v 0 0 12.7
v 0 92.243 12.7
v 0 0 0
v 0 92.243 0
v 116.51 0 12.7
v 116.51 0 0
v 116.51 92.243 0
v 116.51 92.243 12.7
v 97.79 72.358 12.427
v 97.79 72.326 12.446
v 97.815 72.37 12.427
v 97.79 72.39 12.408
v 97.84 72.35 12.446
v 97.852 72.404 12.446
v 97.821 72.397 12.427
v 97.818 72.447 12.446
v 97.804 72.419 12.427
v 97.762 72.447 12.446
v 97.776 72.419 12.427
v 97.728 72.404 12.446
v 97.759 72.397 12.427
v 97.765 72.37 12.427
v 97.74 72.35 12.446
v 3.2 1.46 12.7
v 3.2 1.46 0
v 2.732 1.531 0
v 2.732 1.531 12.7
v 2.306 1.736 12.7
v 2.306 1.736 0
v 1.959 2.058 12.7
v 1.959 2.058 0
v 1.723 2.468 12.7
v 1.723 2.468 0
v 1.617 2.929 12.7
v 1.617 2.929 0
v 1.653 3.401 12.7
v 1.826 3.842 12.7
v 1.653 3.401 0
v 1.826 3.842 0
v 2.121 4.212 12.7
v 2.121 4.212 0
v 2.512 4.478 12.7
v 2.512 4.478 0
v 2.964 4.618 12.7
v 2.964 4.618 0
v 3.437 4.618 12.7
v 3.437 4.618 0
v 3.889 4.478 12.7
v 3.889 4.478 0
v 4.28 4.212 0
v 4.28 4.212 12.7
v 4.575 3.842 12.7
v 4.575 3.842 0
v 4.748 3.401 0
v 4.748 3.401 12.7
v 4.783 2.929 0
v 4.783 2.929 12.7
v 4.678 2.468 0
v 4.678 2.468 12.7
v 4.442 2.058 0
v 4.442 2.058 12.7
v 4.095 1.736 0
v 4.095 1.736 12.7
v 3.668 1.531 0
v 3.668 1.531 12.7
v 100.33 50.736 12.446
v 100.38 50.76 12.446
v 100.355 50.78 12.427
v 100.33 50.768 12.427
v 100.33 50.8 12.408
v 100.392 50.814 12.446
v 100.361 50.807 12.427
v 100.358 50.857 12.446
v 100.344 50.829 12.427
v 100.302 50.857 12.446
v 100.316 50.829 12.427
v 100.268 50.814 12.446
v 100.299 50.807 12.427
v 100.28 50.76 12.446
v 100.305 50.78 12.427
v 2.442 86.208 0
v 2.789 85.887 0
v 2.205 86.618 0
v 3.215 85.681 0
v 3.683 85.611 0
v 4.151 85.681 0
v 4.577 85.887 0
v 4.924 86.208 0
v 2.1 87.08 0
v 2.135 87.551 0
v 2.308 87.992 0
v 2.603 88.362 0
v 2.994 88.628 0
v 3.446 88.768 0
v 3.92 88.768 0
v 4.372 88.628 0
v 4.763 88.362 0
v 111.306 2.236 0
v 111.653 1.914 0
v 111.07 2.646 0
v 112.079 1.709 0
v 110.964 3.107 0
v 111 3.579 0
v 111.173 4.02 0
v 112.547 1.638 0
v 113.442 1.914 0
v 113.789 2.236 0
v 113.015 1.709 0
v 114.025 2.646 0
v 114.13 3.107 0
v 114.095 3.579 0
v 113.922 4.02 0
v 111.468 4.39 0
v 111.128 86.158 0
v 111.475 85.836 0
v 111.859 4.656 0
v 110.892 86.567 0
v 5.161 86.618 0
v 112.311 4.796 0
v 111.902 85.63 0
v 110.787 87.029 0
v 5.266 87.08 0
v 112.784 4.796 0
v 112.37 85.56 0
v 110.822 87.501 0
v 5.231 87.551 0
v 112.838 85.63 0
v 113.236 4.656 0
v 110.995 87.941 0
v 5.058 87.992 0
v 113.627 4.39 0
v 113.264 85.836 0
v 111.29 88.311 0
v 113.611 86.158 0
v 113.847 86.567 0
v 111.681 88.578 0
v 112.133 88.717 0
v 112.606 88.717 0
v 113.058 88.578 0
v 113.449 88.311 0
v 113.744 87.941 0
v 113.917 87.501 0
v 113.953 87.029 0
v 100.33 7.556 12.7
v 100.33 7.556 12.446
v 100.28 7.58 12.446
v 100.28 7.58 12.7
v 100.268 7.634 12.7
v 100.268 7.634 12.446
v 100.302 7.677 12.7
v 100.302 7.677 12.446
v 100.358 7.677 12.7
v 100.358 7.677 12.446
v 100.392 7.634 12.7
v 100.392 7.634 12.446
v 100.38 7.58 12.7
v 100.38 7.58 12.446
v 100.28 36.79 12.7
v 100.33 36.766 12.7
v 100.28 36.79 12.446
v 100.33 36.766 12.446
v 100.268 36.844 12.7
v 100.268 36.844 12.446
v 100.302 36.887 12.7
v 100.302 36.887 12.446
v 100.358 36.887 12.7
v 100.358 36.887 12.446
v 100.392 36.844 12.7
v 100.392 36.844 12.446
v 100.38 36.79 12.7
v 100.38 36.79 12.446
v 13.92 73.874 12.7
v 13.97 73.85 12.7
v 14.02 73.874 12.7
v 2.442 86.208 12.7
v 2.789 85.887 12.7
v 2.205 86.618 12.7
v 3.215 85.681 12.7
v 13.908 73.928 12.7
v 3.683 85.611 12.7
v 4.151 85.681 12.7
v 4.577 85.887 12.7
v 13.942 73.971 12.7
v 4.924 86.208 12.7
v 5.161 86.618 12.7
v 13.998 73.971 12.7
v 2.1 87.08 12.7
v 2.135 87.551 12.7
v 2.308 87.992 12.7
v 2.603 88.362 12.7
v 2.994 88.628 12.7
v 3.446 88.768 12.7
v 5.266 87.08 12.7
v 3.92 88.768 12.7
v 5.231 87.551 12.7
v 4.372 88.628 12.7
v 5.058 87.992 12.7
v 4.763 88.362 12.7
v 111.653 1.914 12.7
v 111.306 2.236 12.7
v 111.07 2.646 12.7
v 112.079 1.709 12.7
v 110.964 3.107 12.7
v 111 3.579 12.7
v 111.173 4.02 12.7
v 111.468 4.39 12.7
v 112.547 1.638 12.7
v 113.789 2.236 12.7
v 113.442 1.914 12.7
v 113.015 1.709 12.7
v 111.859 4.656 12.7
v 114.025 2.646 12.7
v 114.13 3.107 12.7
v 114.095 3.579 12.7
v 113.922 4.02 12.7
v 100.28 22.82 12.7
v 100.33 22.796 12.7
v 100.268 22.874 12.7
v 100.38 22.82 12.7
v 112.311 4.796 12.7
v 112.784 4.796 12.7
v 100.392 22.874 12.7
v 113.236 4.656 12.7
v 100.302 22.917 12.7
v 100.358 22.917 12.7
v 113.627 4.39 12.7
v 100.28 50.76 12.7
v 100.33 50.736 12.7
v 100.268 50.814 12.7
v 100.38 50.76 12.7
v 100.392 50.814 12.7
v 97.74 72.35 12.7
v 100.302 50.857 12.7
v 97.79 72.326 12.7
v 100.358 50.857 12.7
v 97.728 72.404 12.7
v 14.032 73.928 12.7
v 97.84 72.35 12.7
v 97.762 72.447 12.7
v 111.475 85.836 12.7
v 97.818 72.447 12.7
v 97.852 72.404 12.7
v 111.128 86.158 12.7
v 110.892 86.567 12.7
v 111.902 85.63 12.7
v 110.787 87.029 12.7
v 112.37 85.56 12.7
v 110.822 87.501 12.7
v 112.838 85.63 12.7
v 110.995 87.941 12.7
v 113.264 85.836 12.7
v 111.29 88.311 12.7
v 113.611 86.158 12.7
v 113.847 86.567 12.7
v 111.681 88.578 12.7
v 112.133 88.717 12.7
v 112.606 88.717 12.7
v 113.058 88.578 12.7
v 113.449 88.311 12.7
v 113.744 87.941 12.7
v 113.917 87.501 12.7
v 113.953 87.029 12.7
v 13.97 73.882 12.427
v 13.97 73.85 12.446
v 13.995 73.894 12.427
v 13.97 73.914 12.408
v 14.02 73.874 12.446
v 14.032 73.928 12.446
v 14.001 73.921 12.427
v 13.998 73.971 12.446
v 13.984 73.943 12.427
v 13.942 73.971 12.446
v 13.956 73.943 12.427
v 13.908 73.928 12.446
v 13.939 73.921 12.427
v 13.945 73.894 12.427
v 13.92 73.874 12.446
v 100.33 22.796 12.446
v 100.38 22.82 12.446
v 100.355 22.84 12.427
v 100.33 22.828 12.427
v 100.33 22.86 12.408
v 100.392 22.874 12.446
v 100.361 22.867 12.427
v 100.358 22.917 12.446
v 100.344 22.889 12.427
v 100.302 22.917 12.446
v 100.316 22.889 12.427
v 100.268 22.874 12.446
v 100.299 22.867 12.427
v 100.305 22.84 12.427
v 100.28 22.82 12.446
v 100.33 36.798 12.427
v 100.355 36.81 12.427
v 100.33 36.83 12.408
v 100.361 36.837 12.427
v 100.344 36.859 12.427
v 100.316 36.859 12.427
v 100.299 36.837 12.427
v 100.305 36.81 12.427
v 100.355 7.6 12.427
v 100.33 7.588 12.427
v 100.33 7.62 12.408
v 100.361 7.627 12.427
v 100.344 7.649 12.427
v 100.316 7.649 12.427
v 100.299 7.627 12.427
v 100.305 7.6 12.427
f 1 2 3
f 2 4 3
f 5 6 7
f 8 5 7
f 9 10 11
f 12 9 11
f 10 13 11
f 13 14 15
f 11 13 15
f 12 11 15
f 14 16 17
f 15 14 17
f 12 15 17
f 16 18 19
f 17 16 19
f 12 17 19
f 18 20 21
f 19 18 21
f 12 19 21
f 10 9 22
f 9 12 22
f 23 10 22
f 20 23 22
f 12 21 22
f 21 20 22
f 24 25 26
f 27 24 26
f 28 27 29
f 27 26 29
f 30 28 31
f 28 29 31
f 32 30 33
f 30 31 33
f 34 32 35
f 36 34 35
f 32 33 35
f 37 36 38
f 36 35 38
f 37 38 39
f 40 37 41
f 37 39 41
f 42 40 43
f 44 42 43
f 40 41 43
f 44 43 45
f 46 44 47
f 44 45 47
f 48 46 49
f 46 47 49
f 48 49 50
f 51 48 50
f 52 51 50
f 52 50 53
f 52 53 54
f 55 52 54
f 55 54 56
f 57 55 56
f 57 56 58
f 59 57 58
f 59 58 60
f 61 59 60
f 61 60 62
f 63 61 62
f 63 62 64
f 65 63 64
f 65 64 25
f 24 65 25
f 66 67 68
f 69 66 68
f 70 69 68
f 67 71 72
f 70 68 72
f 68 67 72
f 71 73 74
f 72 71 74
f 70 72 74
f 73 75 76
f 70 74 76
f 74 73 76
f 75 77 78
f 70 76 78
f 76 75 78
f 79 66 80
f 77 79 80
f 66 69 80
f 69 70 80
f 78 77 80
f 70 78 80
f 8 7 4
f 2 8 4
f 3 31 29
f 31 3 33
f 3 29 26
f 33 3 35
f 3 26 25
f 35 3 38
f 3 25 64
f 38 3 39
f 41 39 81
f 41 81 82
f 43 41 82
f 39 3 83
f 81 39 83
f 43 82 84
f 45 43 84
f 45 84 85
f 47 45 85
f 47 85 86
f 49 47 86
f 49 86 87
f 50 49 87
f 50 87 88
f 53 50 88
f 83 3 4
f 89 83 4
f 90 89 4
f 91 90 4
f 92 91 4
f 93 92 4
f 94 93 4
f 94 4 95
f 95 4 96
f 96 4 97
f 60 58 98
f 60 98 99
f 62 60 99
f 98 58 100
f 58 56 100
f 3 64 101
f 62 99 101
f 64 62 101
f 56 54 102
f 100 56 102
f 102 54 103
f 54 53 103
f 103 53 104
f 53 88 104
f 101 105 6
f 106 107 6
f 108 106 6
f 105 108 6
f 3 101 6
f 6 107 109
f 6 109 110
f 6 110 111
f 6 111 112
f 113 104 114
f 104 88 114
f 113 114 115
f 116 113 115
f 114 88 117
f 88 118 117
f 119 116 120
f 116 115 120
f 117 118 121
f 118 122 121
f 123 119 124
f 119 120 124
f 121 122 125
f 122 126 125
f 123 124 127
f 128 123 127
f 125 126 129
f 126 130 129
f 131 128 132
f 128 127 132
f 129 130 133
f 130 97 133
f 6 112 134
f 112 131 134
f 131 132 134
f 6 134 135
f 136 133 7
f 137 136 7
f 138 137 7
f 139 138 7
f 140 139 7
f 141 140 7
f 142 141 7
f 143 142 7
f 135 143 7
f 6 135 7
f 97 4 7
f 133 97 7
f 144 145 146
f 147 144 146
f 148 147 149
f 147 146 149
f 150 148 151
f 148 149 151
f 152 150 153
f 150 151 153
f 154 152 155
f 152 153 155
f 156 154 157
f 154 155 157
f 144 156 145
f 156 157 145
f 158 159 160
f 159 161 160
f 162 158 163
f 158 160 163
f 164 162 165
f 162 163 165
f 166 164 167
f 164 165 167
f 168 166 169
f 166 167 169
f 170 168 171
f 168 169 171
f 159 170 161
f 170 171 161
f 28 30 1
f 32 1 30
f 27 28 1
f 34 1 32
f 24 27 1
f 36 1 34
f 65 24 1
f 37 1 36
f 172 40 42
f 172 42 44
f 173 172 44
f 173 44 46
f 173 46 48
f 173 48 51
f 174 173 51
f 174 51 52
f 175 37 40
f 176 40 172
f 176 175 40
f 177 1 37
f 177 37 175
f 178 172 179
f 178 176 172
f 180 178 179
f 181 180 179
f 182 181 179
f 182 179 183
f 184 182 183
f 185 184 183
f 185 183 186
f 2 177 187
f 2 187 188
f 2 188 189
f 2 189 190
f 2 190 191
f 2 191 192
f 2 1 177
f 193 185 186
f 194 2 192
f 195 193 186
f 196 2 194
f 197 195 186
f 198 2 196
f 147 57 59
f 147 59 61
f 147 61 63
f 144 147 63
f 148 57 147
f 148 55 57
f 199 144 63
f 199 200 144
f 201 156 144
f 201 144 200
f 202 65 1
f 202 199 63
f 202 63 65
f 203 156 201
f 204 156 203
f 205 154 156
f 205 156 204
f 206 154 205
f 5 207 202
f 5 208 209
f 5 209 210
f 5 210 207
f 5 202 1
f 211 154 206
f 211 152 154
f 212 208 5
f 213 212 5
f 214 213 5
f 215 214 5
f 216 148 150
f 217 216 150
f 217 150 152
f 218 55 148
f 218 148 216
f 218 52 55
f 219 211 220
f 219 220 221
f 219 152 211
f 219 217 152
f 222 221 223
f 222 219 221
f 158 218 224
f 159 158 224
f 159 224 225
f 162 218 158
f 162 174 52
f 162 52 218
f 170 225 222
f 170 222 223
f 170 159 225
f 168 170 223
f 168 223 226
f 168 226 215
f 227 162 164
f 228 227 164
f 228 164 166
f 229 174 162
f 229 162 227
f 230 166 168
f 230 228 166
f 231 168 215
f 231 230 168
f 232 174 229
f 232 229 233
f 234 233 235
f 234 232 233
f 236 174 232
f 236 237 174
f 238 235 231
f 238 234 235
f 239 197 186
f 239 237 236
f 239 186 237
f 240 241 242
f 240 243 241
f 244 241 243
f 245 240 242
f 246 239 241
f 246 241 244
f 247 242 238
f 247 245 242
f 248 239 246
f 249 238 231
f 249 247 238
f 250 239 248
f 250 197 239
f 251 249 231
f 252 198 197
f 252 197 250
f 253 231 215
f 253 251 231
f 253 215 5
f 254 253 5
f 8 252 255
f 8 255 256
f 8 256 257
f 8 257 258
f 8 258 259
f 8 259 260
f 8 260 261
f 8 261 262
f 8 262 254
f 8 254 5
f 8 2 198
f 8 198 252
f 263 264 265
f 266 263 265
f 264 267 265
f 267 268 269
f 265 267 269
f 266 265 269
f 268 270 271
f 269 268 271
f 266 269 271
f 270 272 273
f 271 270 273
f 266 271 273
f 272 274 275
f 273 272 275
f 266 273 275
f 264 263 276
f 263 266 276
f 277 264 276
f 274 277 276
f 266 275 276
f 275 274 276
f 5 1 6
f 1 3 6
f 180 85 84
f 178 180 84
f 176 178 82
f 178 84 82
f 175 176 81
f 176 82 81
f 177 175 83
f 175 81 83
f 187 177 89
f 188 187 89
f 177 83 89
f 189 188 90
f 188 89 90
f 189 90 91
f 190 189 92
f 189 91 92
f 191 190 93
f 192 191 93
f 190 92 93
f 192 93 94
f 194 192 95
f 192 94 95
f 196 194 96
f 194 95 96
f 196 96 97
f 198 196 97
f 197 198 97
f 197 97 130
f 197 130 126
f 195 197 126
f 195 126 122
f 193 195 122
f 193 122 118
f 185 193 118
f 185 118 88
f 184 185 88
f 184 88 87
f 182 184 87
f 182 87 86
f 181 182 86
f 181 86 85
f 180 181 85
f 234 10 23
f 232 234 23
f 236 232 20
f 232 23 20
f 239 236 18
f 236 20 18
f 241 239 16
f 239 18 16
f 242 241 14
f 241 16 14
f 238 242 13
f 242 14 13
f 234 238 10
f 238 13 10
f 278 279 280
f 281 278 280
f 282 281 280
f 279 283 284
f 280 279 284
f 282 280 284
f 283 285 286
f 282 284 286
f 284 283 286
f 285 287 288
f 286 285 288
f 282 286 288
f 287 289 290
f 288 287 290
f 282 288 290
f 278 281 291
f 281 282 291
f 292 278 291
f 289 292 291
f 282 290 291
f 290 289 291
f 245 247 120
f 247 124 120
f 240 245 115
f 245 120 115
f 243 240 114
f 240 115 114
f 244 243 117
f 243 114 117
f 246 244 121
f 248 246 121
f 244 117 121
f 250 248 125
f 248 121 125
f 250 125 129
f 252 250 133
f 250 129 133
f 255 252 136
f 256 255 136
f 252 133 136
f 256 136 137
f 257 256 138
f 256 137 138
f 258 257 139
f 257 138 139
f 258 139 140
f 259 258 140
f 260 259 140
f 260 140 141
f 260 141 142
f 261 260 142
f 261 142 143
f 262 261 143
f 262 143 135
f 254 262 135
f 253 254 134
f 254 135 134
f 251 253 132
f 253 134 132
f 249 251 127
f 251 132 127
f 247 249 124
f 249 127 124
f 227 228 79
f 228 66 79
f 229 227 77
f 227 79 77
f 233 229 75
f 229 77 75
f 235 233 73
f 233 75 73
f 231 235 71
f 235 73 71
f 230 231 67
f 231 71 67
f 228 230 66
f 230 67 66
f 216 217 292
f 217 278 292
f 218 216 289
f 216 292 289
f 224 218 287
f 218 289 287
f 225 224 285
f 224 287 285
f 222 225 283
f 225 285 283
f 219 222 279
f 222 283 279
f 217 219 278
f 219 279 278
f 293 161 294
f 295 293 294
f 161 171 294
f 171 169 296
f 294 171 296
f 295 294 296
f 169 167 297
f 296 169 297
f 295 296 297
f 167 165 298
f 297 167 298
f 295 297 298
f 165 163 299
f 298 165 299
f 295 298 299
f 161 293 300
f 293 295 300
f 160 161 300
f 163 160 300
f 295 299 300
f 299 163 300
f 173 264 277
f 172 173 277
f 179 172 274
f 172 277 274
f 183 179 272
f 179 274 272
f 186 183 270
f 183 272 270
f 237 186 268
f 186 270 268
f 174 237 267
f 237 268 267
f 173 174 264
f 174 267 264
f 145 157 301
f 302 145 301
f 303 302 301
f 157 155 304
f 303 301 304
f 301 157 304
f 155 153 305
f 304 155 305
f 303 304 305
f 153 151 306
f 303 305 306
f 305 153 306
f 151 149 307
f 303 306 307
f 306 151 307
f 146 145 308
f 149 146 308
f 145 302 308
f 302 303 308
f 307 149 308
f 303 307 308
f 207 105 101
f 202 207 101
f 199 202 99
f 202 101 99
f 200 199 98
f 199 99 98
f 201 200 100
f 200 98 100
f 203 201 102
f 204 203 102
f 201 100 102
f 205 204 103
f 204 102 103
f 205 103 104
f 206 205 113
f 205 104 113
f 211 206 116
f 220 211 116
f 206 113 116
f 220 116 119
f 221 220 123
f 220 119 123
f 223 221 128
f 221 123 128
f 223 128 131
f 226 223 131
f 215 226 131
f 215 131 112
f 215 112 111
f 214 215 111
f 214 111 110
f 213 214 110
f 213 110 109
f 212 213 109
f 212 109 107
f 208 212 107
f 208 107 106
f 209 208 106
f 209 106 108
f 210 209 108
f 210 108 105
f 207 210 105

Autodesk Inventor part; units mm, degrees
ref_plane "YZ Plane" through (0, 0, 0) normal (1, 0, 0) x (0, 1, 0)
ref_plane "XZ Plane" through (0, 0, 0) normal (0, 1, 0) x (-1, 0, 0)
ref_plane "XY Plane" through (0, 0, 0) normal (0, 0, 1) x (1, 0, 0)
sketch "Sketch1" plane through (0, 0, 0) normal (0, 0, 1) x (1, 0, 0)
  line L0 (0, 0) -> (116.51, 0)
  line L1 (116.51, 0) -> (116.51, 92.2428)
  line L2 (116.51, 92.2428) -> (0, 92.2428)
  line L3 (0, 92.2428) -> (0, 0)
  dimension "d0" = 92.2428
  dimension "d1" = 116.51
extrude "Extrusion1" add sketch "Sketch1" along normal blind 12.7
sketch "Sketch2" plane through (0, 0, 12.7) normal (0, 0, 1) x (1, 0, 0)
  line L0 (0, 92.2428) -> (0, 0) projected
  line L1 (0, 0) -> (116.51, 0) projected
  point P0 (3.683, 87.1982)
  point P1 (3.2004, 3.048)
  point P2 (112.5474, 3.2258)
  point P3 (112.3696, 87.1474)
  dimension "d4" = 3.2004
  dimension "d5" = 3.048
  dimension "d6" = 112.5474
  dimension "d7" = 3.2258
  dimension "d8" = 3.683
  dimension "d9" = 87.1982
  dimension "d10" = 112.3696
  dimension "d11" = 87.1474
hole "Hole1" at (3.683, 87.1982, 12.7) at (3.2004, 3.048, 12.7) at (112.5474, 3.2258, 12.7) at (112.3696, 87.1474, 12.7) direction (0, 0, -1) diameter 3.175 end through all
sketch "Sketch3" plane through (0, 0, 12.7) normal (0, 0, 1) x (1, 0, 0)
  line L0 (0, 92.2428) -> (0, 0) projected
  line L1 (0, 0) -> (116.51, 0) projected
  point P0 (13.97, 73.914)
  point P1 (97.79, 72.39)
  point P2 (100.33, 50.8)
  point P3 (100.33, 36.83)
  point P4 (100.33, 22.86)
  point P5 (100.33, 7.62)
  dimension "d19" = 13.97
  dimension "d20" = 73.914
  dimension "d21" = 97.79
  dimension "d22" = 72.39
  dimension "d26" = 50.8
  dimension "d27" = 36.83
  dimension "d28" = 22.86
  dimension "d36" = 7.62
  dimension "d38" = 100.33
  dimension "d39" = 100.33
  dimension "d40" = 100.33
  dimension "d41" = 100.33
hole "Hole2" at (13.97, 73.914, 12.7) at (97.79, 72.39, 12.7) at (100.33, 50.8, 12.7) at (100.33, 36.83, 12.7) at (100.33, 22.86, 12.7) at (100.33, 7.62, 12.7) direction (0, 0, -1) diameter 0.127 depth 0.254 tip angle 118
equation "\"d39\" = d38"
equation "\"d40\" = d39"
equation "\"d41\" = d40"
properties part number "Board_Inventor_Part"
